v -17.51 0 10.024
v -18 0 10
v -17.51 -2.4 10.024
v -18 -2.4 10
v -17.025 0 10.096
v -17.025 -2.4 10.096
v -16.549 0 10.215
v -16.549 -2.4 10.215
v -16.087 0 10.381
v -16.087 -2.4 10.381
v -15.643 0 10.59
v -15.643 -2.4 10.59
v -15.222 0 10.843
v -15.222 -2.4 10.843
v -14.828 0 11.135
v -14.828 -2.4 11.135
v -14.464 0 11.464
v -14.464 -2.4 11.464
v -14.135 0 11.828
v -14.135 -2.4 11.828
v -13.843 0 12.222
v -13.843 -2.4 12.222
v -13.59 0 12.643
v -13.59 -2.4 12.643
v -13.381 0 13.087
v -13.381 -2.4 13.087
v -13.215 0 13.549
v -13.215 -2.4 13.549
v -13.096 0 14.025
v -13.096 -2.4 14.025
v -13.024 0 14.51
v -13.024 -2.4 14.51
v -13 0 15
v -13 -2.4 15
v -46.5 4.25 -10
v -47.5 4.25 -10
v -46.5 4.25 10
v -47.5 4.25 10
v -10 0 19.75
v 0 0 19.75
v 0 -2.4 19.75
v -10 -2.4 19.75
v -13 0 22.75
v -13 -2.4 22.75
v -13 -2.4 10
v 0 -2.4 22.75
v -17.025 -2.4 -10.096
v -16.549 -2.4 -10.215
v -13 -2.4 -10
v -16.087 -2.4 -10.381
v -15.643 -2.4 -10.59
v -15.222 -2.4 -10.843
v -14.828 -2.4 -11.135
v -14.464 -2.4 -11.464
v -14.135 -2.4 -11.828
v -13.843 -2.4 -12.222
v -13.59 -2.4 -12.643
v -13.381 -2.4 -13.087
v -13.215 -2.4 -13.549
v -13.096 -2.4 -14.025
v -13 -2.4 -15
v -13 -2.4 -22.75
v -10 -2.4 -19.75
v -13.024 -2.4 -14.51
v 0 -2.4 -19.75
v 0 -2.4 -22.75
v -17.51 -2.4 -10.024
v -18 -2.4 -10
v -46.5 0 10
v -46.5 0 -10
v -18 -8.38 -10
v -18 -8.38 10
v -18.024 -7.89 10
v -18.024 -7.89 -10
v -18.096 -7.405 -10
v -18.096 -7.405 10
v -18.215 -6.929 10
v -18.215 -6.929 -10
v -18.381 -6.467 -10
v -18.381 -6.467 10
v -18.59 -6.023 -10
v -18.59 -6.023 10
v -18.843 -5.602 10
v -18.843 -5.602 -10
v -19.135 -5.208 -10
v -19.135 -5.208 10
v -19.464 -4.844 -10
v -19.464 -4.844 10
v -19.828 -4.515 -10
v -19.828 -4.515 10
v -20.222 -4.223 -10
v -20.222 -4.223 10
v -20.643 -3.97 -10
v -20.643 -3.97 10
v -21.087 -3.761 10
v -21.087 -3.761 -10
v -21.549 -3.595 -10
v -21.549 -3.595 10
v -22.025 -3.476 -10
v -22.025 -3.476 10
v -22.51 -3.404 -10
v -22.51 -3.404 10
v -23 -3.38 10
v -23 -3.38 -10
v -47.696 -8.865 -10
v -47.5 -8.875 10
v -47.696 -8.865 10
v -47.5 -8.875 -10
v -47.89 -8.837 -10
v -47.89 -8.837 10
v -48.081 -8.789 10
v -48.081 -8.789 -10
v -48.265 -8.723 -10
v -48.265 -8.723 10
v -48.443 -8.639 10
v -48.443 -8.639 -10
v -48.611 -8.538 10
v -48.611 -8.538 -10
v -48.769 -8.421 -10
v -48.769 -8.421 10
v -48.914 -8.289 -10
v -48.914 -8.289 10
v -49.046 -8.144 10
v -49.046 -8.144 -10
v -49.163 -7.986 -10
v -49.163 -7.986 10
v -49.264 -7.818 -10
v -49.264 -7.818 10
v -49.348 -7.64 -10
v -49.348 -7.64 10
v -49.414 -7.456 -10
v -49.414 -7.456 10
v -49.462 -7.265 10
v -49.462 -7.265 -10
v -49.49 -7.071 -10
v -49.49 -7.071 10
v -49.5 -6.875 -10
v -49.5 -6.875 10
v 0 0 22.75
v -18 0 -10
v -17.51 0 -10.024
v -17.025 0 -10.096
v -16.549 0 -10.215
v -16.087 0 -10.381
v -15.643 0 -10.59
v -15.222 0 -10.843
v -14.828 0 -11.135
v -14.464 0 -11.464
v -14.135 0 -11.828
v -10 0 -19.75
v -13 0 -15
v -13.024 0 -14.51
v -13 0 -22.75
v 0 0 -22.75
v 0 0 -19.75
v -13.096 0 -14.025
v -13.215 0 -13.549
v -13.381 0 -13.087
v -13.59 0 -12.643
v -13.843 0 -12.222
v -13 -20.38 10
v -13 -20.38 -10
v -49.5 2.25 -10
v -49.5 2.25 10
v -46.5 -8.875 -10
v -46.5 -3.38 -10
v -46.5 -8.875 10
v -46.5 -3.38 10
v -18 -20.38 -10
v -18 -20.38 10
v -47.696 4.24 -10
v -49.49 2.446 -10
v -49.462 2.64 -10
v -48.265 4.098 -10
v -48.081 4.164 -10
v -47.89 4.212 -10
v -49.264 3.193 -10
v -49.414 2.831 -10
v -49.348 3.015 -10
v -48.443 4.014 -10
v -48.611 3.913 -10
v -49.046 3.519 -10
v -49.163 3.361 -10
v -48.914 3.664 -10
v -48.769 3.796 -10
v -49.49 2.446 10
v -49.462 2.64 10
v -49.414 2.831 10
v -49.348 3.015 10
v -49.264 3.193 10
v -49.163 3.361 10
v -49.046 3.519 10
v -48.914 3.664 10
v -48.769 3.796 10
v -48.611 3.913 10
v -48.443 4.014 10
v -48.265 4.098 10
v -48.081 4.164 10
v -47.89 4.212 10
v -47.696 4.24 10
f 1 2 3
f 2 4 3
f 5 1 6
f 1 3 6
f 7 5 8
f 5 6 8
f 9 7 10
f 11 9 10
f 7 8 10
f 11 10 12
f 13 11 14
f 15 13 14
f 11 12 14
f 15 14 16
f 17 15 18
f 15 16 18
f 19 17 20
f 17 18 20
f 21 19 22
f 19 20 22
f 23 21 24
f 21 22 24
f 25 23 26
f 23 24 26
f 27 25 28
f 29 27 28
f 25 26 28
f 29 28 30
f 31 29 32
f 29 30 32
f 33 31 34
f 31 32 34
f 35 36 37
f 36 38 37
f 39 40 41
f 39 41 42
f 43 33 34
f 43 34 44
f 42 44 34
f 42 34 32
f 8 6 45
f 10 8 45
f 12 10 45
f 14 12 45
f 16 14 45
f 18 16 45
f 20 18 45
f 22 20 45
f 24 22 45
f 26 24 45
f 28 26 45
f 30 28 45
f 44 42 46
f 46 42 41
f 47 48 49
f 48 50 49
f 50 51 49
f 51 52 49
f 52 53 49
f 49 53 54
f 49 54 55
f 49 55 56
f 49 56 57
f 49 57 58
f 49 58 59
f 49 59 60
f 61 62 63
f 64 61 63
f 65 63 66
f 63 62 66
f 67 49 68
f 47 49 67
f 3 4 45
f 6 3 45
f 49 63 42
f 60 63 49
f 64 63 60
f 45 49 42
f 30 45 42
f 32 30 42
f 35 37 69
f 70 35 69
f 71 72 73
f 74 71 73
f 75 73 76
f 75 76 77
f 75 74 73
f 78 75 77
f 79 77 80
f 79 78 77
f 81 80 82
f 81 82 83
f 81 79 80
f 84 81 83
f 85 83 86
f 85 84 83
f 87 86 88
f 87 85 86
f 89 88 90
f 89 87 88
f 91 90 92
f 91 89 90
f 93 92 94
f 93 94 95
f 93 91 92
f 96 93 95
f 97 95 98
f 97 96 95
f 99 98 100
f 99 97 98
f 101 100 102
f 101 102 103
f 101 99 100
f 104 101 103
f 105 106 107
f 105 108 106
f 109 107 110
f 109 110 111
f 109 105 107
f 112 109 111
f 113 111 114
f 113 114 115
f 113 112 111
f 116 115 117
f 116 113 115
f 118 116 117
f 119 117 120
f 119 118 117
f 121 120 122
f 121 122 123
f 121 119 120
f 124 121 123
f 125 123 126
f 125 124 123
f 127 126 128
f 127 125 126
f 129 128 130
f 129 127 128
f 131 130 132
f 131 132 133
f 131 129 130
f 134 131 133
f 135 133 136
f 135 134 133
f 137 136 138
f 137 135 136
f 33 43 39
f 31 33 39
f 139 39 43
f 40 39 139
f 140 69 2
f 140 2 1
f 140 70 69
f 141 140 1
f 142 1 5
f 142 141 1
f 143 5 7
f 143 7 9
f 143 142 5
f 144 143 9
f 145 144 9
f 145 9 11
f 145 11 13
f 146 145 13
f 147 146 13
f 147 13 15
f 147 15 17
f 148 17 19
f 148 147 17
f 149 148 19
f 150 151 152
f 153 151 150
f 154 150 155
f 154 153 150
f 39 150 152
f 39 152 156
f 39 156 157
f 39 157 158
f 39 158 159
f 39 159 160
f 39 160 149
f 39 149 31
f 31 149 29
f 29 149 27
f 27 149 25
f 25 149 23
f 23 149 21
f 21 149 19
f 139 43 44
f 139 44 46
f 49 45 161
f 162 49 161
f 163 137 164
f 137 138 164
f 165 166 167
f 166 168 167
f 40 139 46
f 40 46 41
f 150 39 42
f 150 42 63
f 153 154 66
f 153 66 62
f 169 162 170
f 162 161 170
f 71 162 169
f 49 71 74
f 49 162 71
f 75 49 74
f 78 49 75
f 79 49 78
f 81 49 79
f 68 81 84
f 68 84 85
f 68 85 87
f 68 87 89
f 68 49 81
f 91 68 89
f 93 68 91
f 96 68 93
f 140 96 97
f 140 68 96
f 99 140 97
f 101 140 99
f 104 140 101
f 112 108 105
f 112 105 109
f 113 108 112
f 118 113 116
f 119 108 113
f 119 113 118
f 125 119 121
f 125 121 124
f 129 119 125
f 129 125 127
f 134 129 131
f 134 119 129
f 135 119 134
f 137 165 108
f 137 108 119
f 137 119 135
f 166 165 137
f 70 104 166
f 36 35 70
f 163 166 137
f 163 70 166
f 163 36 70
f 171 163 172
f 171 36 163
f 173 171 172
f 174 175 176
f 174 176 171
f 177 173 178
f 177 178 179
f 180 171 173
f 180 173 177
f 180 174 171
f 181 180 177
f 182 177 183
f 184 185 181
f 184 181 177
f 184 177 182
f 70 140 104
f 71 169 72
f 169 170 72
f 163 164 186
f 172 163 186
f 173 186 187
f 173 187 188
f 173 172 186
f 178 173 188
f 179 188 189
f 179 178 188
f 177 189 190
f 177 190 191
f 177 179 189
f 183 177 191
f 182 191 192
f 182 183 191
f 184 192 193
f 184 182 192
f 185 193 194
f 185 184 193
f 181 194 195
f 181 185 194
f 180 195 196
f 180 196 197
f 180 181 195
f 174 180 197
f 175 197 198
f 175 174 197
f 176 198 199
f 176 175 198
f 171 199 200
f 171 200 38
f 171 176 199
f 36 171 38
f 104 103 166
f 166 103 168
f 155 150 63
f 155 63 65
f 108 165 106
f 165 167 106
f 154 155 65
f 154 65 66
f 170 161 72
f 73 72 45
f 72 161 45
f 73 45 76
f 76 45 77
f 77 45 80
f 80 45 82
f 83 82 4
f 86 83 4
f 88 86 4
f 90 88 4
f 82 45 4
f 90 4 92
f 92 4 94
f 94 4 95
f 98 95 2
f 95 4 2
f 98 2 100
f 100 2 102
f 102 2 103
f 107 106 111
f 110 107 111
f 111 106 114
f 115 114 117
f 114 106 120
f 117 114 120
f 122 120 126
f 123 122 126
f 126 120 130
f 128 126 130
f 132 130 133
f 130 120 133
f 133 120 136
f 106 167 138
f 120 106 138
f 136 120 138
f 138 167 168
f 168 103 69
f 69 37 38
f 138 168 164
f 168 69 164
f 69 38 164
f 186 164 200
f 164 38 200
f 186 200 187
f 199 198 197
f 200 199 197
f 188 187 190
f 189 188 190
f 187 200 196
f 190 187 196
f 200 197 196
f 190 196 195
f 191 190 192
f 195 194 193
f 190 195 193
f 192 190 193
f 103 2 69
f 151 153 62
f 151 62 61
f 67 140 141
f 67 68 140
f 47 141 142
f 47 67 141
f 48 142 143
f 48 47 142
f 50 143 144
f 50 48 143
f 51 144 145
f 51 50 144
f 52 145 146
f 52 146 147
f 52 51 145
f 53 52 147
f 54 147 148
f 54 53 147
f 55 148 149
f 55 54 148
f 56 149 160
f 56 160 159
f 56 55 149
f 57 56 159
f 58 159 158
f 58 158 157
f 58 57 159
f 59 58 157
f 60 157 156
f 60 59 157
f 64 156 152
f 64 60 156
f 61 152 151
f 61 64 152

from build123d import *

# Parameters (mm, degrees)
SKETCH1_W           = 33.5
SKETCH1_H           = 20
BOSS_EXTRUDE1_DEPTH = 2.4
BOSS_EXTRUDE2_DEPTH = 10
FILLET1_R           = 5
FILLET2_R           = 5
FILLET3_R           = 2


with BuildPart() as part:
    # Sketch1 → Boss-Extrude1 (new body)
    with BuildSketch(Plane(origin=(0, 0, 0), x_dir=(1, 0, 0), z_dir=(0, 1, 0))):
        with Locations((-29.75, 0)):
            Rectangle(SKETCH1_W, SKETCH1_H)
        Polygon((-10, -19.75), (-10, 19.75), (0, 19.75), (0, 22.75), (-13, 22.75), (-13, -22.75), (0, -22.75), (0, -19.75), align=None)
    extrude(amount=-BOSS_EXTRUDE1_DEPTH)

    # Sketch3 → Boss-Extrude2 (add, symmetric)
    with BuildSketch(Plane.XY):
        Polygon((-13, -2.4), (-13, -20.38), (-18, -20.38), (-18, -3.38), (-46.5, -3.38), (-46.5, -8.875), (-49.5, -8.875), (-49.5, 4.25), (-46.5, 4.25), (-46.5, -2.4), align=None)
    extrude(amount=BOSS_EXTRUDE2_DEPTH, both=True)

    # Fillet1
    fillet1_edges = [part.edges().sort_by_distance(p)[0] for p in [
        (-13, -1.2, -10),
        (-13, -1.2, 10),
    ]]
    fillet(fillet1_edges, radius=FILLET1_R)

    # Fillet2
    fillet2_edges = [part.edges().sort_by_distance(p)[0] for p in [
        (-18, -3.38, 0),
    ]]
    fillet(fillet2_edges, radius=FILLET2_R)

    # Fillet3
    fillet3_edges = [part.edges().sort_by_distance(p)[0] for p in [
        (-49.5, 4.25, 0),
        (-49.5, -8.875, 0),
    ]]
    fillet(fillet3_edges, radius=FILLET3_R)


solid = part.part
